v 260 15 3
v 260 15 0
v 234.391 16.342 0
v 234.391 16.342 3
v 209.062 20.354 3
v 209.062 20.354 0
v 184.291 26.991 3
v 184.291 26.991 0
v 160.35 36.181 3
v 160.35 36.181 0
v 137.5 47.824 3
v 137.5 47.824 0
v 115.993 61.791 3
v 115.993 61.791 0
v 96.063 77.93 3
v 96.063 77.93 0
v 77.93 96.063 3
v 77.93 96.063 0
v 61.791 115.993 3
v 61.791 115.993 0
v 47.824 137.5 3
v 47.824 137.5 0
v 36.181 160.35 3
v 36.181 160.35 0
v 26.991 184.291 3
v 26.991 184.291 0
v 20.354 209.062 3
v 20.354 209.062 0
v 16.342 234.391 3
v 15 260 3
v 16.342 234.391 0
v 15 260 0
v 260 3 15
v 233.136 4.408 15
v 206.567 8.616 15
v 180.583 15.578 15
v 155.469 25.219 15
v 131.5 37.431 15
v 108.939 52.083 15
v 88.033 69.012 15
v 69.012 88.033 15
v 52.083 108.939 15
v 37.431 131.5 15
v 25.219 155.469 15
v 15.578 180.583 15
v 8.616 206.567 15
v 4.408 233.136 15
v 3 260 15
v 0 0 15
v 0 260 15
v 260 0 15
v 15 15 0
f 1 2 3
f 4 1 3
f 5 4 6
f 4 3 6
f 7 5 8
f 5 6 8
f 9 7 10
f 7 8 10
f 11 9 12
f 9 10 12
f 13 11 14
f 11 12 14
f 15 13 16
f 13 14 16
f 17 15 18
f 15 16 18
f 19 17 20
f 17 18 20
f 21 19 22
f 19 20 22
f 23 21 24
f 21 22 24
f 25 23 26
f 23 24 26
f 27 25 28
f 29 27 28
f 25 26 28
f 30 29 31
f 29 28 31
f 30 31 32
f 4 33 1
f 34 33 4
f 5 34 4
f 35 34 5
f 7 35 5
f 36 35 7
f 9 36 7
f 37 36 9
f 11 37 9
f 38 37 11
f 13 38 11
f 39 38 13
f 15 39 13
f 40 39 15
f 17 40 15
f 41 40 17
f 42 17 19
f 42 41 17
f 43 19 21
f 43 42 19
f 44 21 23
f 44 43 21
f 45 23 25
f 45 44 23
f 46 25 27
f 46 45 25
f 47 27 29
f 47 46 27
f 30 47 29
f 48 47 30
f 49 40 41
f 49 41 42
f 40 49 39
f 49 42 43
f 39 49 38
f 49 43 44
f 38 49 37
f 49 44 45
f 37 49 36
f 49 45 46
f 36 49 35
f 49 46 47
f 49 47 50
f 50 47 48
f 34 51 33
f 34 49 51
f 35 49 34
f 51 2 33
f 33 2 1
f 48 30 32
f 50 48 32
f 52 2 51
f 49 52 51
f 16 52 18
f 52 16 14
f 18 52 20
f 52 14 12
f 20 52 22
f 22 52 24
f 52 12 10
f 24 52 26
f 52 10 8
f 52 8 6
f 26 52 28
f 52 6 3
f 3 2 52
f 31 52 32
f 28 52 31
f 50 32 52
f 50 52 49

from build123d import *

# Parameters (mm, degrees)
BOSS_EXTRUDE1_DEPTH = 15
BOSS_EXTRUDE2_DEPTH = 245
BOSS_EXTRUDE3_DEPTH = 245
BOSS_EXTRUDE4_DEPTH = 245
CUT_EXTRUDE1_DEPTH  = 245
CHAMFER1_SIZE       = 12


with BuildPart() as part:
    # Sketch1 → Boss-Extrude1 (new body)
    with BuildSketch(Plane.XY):
        with BuildLine():
            Line((15, 15), (260, 15))
            ThreePointArc((260, 15), (86.758838609, 86.758838609), (15, 260))
            Line((15, 260), (15, 15))
        make_face()
    extrude(amount=BOSS_EXTRUDE1_DEPTH)

    # Sketch2 → Boss-Extrude2 (add)
    with BuildSketch(Plane.XZ.offset(-15)):
        Polygon((15, 0), (0, 15), (15, 15), align=None)
    extrude(amount=-BOSS_EXTRUDE2_DEPTH)

    # Sketch3 → Boss-Extrude3 (add)
    with BuildSketch(Plane(origin=(15, 0, 0), x_dir=(0, 0, -1), z_dir=(1, 0, 0))):
        Polygon((0, 15), (-15, 0), (-15, 15), align=None)
    extrude(amount=BOSS_EXTRUDE3_DEPTH)

    # Sketch4 → Boss-Extrude4 (add)
    with BuildSketch(Plane.ZY.offset(-15)):
        Polygon((15, 15), (0, 15), (15, 0), align=None)
    extrude(amount=BOSS_EXTRUDE4_DEPTH)

    # Sketch5 → Cut-Extrude1 (cut)
    with BuildSketch(Plane(origin=(0, 15, 0), x_dir=(1, 0, 0), z_dir=(0, 1, 0))):
        Polygon((0, -15), (15, 0), (-230, 0), (-230, -15), align=None)
    extrude(amount=-CUT_EXTRUDE1_DEPTH, mode=Mode.SUBTRACT)

    # Chamfer1
    chamfer1_edges = [part.edges().sort_by_distance(p)[0] for p in [
        (86.758838609, 86.758838609, 15),
    ]]
    chamfer(chamfer1_edges, length=CHAMFER1_SIZE)


solid = part.part
